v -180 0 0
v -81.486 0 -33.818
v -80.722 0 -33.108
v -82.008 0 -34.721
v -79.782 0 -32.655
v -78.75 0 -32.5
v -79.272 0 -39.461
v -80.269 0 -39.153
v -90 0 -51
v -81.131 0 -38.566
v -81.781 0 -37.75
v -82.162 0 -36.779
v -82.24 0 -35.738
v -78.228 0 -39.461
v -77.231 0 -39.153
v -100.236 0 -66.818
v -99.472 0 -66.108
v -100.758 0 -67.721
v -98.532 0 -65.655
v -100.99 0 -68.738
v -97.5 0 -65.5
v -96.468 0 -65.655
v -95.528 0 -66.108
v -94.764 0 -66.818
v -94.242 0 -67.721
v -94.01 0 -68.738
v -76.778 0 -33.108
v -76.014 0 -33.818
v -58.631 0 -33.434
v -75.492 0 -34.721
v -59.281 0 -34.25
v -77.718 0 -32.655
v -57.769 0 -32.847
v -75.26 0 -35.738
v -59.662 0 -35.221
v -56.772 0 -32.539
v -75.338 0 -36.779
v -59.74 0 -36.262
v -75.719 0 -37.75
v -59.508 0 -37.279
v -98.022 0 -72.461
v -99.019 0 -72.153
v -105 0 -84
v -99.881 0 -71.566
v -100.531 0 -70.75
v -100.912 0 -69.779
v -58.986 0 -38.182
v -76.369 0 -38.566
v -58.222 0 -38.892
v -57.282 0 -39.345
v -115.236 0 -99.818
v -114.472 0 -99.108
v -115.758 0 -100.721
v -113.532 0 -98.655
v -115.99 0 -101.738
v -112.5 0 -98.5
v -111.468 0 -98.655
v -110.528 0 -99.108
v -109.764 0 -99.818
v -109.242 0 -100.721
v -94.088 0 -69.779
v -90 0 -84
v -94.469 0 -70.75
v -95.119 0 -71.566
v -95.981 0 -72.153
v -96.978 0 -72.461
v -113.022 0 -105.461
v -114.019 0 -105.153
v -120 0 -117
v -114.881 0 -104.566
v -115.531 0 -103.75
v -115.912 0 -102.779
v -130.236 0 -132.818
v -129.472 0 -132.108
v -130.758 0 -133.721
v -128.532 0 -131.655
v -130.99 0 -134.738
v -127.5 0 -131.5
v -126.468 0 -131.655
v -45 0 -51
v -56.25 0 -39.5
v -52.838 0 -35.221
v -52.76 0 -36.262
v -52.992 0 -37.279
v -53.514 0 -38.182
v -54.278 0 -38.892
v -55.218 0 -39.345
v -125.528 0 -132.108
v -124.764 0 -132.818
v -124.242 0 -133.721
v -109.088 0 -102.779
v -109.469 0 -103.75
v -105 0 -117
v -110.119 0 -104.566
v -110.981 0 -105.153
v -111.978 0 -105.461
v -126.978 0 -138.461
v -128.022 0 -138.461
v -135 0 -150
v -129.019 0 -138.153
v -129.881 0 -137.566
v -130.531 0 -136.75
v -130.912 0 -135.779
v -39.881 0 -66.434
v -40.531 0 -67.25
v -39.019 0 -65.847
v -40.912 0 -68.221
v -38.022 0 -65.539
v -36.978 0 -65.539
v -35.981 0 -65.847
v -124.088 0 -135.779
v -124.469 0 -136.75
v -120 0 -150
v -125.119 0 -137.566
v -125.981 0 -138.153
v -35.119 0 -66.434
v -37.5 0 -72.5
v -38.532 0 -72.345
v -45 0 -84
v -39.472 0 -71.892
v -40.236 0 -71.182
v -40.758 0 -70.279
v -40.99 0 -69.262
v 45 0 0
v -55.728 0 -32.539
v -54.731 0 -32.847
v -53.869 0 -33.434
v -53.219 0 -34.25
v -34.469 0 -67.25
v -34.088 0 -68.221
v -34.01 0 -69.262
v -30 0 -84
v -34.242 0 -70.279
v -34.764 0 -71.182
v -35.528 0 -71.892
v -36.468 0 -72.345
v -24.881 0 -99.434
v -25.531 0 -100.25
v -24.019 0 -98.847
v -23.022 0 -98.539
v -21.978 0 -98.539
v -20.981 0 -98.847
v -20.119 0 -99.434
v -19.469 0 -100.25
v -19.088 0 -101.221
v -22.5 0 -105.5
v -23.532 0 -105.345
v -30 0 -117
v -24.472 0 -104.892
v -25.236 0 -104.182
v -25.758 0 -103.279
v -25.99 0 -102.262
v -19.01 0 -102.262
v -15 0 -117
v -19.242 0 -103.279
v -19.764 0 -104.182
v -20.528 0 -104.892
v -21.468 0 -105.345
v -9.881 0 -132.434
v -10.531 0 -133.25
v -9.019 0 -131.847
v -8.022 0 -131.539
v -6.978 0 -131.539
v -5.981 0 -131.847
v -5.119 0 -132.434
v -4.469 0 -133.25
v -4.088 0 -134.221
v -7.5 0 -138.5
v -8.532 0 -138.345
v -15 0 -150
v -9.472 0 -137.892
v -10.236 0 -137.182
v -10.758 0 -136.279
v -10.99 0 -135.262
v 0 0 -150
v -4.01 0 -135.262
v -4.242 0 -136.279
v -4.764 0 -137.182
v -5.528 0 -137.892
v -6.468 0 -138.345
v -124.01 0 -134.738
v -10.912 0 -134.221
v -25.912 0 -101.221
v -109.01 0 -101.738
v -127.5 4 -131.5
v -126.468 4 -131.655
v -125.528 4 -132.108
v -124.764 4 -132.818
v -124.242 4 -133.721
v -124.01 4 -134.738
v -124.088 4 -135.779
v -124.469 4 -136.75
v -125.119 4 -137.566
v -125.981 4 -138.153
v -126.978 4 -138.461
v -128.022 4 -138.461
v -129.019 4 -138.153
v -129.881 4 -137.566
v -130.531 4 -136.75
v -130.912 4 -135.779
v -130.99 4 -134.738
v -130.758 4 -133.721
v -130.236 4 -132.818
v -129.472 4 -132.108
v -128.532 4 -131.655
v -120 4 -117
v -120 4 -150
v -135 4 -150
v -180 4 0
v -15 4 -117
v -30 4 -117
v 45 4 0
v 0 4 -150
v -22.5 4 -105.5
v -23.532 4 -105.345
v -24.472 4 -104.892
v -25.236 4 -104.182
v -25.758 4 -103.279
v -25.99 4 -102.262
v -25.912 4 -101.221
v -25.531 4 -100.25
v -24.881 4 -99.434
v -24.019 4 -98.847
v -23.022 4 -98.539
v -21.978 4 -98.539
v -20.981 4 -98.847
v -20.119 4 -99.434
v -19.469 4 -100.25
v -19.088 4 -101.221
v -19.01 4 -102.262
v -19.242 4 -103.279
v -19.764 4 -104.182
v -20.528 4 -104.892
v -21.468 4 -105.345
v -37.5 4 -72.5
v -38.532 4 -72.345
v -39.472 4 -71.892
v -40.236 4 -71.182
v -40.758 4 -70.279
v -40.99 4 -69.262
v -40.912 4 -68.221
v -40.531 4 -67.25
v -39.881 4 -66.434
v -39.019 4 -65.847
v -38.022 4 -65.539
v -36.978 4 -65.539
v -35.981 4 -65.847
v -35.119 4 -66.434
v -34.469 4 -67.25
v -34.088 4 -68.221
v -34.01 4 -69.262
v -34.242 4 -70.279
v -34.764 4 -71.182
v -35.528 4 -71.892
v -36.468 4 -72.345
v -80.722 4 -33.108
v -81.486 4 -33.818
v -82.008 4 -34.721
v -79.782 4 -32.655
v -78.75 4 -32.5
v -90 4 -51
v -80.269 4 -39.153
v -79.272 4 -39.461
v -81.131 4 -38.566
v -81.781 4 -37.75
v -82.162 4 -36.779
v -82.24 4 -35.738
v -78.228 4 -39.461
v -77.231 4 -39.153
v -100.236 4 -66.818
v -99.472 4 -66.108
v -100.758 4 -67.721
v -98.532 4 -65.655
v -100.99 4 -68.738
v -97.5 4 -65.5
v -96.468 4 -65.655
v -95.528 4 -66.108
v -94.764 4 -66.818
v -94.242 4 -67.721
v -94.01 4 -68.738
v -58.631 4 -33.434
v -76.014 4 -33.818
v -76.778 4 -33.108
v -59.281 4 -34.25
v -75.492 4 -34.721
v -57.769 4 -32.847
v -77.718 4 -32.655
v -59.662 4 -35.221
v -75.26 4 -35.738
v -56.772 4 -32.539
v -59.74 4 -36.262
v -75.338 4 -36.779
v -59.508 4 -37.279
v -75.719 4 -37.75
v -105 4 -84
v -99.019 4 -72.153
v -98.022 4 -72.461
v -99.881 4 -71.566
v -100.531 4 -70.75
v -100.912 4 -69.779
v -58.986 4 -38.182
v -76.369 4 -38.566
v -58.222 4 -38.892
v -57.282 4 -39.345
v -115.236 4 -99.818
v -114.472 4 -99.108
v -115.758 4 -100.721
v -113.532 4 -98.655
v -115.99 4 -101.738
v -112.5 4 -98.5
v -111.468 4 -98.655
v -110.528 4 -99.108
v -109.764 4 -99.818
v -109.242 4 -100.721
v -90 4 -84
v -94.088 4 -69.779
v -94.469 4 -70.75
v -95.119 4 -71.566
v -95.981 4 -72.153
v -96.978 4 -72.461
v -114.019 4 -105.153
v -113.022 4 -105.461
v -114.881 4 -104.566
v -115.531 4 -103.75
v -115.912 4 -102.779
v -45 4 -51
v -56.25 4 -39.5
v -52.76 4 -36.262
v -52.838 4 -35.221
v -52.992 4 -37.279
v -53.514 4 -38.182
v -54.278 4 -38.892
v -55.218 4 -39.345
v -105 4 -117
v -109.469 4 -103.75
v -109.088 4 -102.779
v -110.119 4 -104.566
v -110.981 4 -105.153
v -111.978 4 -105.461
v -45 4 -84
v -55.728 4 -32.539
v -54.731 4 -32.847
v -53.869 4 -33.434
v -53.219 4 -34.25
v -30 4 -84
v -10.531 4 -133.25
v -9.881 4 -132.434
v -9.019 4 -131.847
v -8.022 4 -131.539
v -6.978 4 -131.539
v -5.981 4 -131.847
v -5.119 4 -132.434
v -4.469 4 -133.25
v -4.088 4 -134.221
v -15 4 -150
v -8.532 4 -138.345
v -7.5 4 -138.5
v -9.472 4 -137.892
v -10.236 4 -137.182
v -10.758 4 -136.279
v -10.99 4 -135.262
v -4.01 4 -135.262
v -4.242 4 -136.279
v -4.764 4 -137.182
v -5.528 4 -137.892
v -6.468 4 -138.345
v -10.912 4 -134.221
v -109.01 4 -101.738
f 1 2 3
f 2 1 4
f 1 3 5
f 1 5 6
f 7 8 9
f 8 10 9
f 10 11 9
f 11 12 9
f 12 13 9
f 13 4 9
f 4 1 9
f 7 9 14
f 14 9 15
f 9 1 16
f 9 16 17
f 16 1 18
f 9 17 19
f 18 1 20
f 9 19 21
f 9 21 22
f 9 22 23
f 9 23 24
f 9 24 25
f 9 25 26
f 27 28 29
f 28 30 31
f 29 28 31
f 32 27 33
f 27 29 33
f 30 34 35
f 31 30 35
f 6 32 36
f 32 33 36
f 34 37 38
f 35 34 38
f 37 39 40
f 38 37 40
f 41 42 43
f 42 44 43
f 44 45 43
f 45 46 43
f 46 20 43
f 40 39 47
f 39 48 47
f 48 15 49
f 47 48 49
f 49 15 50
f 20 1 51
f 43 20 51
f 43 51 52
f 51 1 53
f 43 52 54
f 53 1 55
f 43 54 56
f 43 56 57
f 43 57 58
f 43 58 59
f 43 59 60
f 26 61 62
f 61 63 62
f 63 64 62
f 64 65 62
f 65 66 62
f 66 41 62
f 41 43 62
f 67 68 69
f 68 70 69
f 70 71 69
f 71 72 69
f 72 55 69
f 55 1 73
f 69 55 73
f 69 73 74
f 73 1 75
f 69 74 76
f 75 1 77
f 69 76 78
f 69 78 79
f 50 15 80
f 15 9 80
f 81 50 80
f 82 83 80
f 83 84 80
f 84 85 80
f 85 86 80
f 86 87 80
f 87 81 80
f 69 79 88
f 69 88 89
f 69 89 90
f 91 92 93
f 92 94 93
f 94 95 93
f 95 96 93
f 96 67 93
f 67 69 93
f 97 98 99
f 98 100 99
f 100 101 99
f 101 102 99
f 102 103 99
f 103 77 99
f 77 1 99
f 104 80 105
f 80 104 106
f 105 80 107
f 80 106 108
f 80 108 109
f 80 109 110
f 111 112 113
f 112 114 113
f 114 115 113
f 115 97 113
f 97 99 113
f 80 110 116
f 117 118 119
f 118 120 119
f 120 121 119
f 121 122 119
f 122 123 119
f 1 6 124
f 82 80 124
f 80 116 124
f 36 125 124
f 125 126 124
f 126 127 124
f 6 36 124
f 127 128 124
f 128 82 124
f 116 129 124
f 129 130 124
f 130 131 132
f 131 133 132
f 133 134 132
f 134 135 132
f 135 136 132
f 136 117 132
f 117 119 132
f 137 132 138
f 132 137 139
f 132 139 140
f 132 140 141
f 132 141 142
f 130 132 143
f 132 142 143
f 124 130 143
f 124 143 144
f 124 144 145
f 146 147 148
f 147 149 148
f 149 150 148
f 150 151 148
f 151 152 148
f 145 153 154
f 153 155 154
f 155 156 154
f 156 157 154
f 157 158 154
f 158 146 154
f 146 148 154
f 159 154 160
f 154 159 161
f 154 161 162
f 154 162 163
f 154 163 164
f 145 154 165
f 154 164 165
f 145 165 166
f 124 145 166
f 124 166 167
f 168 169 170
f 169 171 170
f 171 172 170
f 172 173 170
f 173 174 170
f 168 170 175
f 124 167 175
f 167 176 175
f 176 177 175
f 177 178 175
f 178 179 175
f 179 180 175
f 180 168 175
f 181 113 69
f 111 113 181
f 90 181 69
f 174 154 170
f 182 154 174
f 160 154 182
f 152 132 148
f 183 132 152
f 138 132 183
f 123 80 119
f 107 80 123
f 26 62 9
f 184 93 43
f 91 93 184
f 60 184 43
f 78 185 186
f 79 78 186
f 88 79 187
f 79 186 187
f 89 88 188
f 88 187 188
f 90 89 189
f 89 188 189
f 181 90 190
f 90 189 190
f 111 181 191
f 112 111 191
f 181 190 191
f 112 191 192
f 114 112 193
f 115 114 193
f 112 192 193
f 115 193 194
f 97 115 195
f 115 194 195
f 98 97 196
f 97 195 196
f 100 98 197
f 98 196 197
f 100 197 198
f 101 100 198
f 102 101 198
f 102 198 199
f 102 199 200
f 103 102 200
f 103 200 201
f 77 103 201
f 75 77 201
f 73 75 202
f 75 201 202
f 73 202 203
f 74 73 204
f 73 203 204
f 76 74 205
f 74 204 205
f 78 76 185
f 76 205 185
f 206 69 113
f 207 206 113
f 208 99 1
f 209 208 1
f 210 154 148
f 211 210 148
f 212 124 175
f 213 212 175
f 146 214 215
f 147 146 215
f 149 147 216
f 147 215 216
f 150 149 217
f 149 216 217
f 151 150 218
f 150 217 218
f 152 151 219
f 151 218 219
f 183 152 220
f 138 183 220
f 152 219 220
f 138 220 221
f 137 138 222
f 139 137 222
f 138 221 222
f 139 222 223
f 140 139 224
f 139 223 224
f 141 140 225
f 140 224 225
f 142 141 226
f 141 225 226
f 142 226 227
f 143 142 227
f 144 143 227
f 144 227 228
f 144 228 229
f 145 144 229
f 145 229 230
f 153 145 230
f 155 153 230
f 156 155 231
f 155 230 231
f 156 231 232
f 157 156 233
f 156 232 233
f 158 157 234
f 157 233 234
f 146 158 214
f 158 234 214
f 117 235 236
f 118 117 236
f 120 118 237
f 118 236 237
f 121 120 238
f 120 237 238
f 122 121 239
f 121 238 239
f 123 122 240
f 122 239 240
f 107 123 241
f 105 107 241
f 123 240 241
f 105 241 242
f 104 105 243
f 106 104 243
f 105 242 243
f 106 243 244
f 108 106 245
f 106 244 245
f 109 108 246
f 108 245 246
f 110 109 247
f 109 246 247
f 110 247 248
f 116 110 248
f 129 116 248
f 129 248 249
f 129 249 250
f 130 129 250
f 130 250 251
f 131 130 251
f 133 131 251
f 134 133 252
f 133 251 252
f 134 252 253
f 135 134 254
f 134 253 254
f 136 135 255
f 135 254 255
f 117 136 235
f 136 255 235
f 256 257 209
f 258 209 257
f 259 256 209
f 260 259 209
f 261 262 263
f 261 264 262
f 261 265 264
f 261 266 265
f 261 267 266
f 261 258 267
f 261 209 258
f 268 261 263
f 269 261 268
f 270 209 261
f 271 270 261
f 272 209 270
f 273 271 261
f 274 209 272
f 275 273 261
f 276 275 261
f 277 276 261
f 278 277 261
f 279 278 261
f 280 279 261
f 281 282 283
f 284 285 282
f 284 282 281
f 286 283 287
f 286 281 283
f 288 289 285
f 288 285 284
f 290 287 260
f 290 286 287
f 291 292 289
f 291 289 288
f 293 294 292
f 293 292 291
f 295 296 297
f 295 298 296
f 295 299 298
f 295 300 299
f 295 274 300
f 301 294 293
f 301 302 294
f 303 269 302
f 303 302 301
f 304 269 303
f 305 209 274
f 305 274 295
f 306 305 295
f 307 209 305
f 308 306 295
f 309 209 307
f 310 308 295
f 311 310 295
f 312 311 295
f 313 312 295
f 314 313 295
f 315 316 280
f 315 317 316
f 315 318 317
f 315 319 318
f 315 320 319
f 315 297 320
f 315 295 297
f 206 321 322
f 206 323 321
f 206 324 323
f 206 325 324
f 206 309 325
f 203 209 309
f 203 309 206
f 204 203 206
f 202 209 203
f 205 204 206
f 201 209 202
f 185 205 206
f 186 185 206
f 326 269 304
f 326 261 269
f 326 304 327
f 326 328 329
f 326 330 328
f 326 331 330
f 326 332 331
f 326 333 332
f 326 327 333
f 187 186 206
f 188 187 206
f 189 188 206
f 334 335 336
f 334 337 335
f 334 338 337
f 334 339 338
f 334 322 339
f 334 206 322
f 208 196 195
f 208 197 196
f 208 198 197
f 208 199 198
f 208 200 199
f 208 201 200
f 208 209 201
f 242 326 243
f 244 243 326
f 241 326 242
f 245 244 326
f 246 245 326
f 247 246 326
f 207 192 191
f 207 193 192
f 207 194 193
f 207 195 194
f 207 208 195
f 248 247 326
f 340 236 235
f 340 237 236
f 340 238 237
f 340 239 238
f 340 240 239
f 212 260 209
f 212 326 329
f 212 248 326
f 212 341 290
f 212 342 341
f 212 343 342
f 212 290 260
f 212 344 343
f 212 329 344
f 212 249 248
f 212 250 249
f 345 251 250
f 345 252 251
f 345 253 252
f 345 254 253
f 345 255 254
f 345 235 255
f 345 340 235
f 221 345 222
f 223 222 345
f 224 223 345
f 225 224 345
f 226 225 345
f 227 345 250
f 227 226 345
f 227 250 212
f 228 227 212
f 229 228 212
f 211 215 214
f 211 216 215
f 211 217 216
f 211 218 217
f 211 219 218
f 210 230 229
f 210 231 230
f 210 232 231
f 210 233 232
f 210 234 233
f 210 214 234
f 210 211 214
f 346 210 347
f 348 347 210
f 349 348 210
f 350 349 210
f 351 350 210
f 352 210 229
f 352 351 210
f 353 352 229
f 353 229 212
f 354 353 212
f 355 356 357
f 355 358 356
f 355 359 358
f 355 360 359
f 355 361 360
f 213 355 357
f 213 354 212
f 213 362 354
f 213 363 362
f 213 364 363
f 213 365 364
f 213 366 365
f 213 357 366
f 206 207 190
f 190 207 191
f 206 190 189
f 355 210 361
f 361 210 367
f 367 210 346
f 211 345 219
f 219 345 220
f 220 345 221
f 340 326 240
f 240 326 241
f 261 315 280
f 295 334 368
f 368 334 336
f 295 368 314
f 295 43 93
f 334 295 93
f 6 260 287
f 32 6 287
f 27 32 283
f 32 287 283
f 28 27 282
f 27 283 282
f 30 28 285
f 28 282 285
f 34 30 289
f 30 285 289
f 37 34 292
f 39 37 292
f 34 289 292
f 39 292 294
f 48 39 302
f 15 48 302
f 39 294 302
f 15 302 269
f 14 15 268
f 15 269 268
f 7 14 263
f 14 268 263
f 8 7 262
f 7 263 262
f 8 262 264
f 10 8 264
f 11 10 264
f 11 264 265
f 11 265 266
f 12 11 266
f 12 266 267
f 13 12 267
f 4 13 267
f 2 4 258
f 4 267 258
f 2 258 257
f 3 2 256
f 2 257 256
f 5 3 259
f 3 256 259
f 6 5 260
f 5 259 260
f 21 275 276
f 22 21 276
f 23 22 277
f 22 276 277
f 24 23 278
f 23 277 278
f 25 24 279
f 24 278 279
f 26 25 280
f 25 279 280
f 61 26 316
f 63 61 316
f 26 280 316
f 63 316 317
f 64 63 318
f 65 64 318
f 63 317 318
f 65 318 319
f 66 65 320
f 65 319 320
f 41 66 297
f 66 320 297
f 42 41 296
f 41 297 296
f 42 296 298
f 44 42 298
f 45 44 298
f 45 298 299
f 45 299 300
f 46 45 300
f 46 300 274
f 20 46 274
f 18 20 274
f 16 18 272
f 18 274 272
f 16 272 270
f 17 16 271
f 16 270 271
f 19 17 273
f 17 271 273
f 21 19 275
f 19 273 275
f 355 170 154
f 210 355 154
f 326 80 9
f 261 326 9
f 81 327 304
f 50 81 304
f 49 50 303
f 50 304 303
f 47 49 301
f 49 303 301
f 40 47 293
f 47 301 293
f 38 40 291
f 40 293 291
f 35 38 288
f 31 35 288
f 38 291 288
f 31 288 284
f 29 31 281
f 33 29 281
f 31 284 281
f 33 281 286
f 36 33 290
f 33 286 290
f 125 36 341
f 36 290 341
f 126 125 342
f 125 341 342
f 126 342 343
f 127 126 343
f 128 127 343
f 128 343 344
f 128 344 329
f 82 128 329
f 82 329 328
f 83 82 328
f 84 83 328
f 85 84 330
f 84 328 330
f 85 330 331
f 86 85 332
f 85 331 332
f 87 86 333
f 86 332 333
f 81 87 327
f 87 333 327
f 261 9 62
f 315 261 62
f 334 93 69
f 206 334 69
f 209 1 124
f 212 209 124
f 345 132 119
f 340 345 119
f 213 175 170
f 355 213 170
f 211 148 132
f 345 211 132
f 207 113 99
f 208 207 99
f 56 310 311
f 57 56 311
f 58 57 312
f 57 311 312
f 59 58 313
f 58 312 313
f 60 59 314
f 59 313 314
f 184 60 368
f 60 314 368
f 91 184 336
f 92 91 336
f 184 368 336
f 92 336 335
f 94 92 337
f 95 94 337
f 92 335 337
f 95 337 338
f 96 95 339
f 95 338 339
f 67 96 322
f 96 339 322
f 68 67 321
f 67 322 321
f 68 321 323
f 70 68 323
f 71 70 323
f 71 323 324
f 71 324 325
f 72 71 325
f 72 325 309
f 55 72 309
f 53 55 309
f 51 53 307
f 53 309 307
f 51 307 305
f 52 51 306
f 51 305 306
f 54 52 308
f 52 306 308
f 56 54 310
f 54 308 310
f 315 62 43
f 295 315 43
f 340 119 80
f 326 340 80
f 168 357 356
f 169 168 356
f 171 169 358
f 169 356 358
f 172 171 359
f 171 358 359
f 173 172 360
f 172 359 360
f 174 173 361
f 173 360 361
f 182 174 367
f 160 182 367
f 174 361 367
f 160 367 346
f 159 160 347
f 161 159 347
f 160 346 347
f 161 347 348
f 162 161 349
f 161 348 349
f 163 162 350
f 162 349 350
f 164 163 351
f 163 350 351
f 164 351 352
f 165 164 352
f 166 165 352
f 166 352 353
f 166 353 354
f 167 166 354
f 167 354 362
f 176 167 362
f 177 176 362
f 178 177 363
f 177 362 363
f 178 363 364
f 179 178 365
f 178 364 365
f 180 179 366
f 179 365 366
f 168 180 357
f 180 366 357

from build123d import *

# Parameters (mm, degrees)
BOSS_EXTRUDE2_DEPTH = 4
SKETCH2_R           = 3.5
CUT_EXTRUDE1_DEPTH  = 4
SKETCH3_W           = 225
SKETCH3_H           = 150
BOSS_EXTRUDE3_DEPTH = 4


with BuildPart() as part:
    # Sketch1 → Boss-Extrude2 (new body)
    with BuildSketch(Plane(origin=(0, 0, 0), x_dir=(1, 0, 0), z_dir=(0, 1, 0))):
        Polygon((-120, 117), (-120, 150), (-135, 150), (-180, 0), (-135, 0), (0, 0), (45, 0), (0, 150), (-15, 150), (-15, 117), (-30, 117), (-30, 84), (-45, 84), (-45, 51), (-90, 51), (-90, 84), (-105, 84), (-105, 117), align=None)
    extrude(amount=BOSS_EXTRUDE2_DEPTH)

    # Sketch2 → Cut-Extrude1 (cut)
    with BuildSketch(Plane(origin=(0, 4, 0), x_dir=(1, 0, 0), z_dir=(0, 1, 0))):
        with Locations(Location((-127.5, 135, 0), (0, 0, 270))):
            Circle(SKETCH2_R)
        with Locations(Location((-112.5, 102, 0), (0, 0, 270))):
            Circle(SKETCH2_R)
        with Locations(Location((-97.5, 69, 0), (0, 0, 270))):
            Circle(SKETCH2_R)
        with Locations(Location((-78.75, 36, 0), (0, 0, 270))):
            Circle(SKETCH2_R)
        with Locations(Location((-56.25, 36, 0), (0, 0, 90))):
            Circle(SKETCH2_R)
        with Locations(Location((-37.5, 69, 0), (0, 0, 90))):
            Circle(SKETCH2_R)
        with Locations(Location((-22.5, 102, 0), (0, 0, 90))):
            Circle(SKETCH2_R)
        with Locations(Location((-7.5, 135, 0), (0, 0, 90))):
            Circle(SKETCH2_R)
    extrude(amount=-CUT_EXTRUDE1_DEPTH, mode=Mode.SUBTRACT)

    # Sketch3 → Boss-Extrude3 (add)
    with BuildSketch(Plane(origin=(0, 4, 0), x_dir=(1, 0, 0), z_dir=(0, 1, 0))):
        with Locations((-67.5, -75)):
            Rectangle(SKETCH3_W, SKETCH3_H)
    extrude(amount=BOSS_EXTRUDE3_DEPTH)


with BuildPart() as boss_extrude3_kept_piece:
    # of the separate pieces the step leaves, the one the design keeps (boss_extrude3_pieces_kept)
    add(part.part.solids().sort_by_distance((-120, 0, -117))[0])


solid = boss_extrude3_kept_piece.part
